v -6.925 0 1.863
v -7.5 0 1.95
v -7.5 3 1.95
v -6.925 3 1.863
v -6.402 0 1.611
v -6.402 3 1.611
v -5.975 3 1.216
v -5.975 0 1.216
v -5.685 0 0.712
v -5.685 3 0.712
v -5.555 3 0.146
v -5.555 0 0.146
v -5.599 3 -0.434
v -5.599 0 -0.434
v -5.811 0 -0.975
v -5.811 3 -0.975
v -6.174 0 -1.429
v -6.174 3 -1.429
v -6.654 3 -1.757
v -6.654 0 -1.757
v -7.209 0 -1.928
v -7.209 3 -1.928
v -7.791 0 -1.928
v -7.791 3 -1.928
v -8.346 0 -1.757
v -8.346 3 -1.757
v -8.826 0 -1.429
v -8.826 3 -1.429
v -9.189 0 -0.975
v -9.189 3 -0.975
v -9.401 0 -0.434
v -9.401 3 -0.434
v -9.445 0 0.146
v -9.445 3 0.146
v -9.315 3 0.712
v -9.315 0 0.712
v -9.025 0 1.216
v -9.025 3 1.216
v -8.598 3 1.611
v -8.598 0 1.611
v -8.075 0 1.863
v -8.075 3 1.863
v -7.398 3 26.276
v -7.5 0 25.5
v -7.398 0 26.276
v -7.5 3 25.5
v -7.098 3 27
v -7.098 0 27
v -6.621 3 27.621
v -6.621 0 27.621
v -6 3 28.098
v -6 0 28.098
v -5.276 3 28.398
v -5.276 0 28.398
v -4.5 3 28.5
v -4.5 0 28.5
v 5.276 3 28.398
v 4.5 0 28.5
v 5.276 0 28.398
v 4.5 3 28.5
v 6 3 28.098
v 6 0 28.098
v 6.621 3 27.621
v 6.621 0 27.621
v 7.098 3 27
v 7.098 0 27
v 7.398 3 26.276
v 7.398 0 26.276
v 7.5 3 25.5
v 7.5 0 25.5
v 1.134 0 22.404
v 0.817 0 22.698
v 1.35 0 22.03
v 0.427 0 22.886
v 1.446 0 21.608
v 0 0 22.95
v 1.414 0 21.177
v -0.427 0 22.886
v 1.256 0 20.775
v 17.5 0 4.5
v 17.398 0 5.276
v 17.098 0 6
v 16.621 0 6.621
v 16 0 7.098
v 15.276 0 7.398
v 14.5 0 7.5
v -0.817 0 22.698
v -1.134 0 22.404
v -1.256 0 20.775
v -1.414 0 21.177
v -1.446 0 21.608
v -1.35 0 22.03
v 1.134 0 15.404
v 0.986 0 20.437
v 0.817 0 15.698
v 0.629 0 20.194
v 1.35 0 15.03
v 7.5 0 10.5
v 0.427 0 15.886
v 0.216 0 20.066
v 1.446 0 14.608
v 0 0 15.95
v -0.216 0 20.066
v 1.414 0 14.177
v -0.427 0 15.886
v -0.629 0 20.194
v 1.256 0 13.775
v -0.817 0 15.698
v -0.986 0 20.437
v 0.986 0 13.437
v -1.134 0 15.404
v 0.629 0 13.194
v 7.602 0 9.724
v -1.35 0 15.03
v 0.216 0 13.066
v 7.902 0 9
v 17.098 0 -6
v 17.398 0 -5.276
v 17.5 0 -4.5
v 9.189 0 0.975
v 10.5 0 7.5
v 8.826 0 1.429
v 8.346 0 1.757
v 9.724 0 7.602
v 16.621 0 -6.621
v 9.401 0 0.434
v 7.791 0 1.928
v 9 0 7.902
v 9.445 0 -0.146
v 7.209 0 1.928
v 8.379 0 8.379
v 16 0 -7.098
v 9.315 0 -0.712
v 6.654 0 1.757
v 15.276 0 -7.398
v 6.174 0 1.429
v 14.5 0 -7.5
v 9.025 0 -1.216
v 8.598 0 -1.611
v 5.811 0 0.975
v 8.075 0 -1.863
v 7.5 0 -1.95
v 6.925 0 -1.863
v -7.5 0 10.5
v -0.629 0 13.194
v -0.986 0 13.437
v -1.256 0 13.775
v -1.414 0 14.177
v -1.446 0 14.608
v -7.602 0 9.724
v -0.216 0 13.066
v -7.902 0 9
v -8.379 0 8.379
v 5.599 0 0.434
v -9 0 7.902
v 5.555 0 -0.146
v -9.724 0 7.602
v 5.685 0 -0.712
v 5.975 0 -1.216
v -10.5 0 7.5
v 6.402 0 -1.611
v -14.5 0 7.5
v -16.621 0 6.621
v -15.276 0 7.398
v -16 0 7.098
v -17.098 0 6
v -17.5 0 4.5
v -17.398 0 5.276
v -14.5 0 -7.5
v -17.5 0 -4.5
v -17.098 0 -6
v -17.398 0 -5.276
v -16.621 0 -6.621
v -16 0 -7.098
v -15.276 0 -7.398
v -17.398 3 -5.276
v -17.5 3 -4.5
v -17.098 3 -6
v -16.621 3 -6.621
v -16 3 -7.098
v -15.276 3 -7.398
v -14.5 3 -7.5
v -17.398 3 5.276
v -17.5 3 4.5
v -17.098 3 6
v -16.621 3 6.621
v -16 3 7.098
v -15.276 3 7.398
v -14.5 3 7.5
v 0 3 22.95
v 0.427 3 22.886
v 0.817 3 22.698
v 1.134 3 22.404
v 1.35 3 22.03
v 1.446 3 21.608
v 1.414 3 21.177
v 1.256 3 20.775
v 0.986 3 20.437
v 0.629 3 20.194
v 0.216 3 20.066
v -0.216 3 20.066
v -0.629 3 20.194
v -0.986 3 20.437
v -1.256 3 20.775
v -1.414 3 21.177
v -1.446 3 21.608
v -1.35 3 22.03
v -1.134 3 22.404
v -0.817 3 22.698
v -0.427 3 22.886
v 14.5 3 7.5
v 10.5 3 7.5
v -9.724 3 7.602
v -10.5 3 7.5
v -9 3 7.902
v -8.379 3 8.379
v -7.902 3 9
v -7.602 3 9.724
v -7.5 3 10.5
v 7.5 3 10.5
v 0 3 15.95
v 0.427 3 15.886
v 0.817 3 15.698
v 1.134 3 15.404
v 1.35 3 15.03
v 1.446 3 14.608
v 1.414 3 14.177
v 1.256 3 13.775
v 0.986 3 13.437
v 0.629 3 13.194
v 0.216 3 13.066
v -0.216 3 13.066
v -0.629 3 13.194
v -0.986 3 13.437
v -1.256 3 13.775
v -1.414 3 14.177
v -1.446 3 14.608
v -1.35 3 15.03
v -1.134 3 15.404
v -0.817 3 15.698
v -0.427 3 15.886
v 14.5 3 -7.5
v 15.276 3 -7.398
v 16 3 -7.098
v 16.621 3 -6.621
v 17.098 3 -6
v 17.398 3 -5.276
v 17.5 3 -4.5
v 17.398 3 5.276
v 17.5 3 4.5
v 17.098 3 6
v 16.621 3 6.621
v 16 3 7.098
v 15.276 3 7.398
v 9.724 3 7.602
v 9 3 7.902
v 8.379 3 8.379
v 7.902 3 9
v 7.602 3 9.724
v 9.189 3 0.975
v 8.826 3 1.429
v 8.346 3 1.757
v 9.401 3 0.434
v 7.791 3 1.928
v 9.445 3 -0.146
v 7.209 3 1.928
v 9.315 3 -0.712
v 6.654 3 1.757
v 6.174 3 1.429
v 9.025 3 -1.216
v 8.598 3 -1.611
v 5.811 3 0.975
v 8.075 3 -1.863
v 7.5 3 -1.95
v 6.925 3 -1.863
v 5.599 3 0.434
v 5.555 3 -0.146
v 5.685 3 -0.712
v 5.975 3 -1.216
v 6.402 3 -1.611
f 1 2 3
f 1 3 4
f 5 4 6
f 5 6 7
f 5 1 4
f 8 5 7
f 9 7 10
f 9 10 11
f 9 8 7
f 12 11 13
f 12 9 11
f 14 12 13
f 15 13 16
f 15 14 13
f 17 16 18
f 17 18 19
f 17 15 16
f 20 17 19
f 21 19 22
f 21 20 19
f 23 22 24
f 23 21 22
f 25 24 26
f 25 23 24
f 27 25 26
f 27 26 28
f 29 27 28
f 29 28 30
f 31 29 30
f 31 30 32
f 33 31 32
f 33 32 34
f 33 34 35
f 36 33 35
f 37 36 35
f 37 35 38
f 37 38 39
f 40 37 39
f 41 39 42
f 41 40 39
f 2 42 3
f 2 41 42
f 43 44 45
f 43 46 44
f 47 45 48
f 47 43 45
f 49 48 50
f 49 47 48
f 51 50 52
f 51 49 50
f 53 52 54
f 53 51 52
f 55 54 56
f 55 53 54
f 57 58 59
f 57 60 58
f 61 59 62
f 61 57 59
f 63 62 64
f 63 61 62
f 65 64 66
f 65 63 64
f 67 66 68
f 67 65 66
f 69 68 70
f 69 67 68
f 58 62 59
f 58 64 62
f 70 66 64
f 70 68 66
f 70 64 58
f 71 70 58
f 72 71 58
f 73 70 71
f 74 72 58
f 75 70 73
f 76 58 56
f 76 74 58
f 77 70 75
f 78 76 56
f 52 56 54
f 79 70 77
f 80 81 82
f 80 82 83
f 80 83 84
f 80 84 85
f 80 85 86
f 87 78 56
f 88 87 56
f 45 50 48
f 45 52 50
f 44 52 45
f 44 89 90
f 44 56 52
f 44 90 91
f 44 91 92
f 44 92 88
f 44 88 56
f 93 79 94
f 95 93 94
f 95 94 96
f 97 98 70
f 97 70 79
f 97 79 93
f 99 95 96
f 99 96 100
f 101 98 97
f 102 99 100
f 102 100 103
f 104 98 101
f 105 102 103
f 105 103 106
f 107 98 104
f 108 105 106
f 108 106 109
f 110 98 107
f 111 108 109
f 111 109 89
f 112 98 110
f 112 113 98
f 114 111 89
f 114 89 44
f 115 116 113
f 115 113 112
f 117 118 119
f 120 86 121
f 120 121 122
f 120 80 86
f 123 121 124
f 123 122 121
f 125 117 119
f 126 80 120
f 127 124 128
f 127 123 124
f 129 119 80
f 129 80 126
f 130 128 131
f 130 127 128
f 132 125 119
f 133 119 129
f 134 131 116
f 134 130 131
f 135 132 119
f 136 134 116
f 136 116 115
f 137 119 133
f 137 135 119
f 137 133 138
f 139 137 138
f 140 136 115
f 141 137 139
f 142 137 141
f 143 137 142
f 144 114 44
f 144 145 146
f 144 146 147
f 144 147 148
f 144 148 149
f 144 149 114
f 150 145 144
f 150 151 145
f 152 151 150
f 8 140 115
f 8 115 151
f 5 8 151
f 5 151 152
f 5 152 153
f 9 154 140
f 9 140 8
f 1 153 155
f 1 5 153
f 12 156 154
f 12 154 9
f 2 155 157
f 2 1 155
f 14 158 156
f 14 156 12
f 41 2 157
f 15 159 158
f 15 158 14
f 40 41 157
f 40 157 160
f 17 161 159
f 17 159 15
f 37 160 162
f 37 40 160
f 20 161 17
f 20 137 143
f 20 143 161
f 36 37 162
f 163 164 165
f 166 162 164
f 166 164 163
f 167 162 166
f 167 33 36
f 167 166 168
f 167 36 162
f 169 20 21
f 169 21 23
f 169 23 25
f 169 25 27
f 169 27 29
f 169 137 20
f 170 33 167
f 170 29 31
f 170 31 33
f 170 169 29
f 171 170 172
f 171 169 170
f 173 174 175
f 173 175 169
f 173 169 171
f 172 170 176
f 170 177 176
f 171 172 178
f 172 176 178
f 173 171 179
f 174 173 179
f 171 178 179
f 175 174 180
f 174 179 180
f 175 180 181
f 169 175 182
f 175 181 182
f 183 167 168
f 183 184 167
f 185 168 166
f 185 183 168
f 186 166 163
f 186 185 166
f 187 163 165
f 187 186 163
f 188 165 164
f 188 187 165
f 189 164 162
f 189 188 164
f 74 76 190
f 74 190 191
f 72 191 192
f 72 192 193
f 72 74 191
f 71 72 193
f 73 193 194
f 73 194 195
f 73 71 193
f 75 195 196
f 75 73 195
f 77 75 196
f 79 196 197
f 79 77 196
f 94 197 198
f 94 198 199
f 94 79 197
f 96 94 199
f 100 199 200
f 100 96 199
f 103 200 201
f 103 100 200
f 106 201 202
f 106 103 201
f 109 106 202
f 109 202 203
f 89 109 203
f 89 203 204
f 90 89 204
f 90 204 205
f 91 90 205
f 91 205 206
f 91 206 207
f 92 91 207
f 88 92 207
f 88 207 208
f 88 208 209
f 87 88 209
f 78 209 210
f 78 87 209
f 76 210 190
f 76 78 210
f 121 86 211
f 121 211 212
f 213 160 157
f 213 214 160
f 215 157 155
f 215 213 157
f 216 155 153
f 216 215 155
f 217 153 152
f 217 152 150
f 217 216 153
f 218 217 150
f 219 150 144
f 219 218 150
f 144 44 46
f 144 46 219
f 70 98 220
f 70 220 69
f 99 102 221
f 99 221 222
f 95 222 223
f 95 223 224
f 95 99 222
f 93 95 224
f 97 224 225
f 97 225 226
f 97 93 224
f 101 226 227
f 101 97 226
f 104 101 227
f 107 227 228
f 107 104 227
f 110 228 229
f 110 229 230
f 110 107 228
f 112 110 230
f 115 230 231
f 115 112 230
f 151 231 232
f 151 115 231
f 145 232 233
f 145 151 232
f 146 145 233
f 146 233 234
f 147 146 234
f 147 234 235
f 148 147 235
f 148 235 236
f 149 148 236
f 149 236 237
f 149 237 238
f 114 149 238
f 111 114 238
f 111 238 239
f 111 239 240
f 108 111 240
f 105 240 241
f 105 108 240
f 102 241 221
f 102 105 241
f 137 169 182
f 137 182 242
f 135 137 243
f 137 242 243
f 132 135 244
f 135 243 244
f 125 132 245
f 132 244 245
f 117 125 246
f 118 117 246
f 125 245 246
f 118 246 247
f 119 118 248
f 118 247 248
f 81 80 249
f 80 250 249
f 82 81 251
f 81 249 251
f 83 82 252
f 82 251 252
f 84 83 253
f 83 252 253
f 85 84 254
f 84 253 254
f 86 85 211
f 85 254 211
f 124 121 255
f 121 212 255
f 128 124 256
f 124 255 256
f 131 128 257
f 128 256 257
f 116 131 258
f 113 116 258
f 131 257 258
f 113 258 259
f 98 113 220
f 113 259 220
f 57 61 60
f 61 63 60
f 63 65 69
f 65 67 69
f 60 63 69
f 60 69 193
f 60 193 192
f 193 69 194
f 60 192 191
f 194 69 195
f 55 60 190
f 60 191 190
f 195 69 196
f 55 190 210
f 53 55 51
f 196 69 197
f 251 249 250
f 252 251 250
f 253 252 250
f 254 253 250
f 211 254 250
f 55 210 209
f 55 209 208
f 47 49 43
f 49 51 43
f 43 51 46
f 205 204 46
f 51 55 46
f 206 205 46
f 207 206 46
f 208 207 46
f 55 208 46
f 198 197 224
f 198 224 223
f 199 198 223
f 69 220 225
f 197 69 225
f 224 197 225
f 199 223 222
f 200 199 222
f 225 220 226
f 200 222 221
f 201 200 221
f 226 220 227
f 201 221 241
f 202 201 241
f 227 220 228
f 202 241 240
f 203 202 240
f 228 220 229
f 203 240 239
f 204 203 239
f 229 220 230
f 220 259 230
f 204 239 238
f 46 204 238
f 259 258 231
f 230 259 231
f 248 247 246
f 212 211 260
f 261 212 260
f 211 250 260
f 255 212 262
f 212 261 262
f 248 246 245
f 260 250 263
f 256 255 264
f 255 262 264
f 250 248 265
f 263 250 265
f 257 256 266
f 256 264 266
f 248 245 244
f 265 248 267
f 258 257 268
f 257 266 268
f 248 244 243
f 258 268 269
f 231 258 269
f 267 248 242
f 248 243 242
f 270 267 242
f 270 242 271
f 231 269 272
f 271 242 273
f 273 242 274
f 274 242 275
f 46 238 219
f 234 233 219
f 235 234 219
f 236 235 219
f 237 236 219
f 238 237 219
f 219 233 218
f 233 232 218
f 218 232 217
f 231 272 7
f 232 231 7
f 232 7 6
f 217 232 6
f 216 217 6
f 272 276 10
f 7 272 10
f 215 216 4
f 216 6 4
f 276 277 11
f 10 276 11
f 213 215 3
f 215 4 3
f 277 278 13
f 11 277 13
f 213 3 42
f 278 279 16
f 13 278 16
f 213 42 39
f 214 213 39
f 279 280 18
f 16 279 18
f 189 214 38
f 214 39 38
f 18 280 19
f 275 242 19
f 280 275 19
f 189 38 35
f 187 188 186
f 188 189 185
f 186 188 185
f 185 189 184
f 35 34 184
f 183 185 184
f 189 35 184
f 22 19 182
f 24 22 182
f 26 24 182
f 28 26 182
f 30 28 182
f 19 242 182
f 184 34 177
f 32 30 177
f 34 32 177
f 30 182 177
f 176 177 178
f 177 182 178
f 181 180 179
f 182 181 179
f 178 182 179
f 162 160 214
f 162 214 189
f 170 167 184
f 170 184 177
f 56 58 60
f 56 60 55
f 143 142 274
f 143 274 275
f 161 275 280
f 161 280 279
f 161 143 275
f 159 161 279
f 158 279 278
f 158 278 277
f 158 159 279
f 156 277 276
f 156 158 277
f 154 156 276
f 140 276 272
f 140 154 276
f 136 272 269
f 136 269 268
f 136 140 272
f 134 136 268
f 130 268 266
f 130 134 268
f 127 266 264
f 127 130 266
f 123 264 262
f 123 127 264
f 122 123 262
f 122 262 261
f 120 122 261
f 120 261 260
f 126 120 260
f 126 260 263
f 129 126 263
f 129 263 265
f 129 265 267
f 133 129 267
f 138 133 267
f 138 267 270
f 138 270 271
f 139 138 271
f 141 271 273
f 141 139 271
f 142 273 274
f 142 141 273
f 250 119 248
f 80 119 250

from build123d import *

# Parameters (mm, degrees)
SKETCH_1_R      = 1.45
SKETCH_1_R_2    = 1.95
EXTRUDE_1_DEPTH = 3
FILLET_2_R      = 3


with BuildPart() as part:
    # 草图1 → 凸台-拉伸1 (new body)
    with BuildSketch(Plane(origin=(0, 0, 0), x_dir=(1, 0, 0), z_dir=(0, 1, 0))):
        Polygon((-17.5, -7.5), (-17.5, 7.5), (17.5, 7.5), (17.5, -7.5), (7.5, -7.5), (7.5, -28.5), (-7.5, -28.5), (-7.5, -7.5), align=None)
        with Locations(Location((0, -14.5, 0), (0, 0, 270))):
            Circle(SKETCH_1_R, mode=Mode.SUBTRACT)
        with Locations(Location((0, -21.5, 0), (0, 0, 270))):
            Circle(SKETCH_1_R, mode=Mode.SUBTRACT)
        with Locations(Location((-7.5, 0, 0), (0, 0, 270))):
            Circle(SKETCH_1_R_2, mode=Mode.SUBTRACT)
        with Locations(Location((7.5, 0, 0), (0, 0, 90))):
            Circle(SKETCH_1_R_2, mode=Mode.SUBTRACT)
    extrude(amount=EXTRUDE_1_DEPTH)

    # 圆角2
    fillet_2_edges = [part.edges().sort_by_distance(p)[0] for p in [
        (17.5, 1.5, 7.5),
        (7.5, 1.5, 7.5),
        (7.5, 1.5, 28.5),
        (-7.5, 1.5, 28.5),
        (-7.5, 1.5, 7.5),
        (-17.5, 1.5, 7.5),
        (-17.5, 1.5, -7.5),
        (17.5, 1.5, -7.5),
    ]]
    fillet(fillet_2_edges, radius=FILLET_2_R)


solid = part.part
